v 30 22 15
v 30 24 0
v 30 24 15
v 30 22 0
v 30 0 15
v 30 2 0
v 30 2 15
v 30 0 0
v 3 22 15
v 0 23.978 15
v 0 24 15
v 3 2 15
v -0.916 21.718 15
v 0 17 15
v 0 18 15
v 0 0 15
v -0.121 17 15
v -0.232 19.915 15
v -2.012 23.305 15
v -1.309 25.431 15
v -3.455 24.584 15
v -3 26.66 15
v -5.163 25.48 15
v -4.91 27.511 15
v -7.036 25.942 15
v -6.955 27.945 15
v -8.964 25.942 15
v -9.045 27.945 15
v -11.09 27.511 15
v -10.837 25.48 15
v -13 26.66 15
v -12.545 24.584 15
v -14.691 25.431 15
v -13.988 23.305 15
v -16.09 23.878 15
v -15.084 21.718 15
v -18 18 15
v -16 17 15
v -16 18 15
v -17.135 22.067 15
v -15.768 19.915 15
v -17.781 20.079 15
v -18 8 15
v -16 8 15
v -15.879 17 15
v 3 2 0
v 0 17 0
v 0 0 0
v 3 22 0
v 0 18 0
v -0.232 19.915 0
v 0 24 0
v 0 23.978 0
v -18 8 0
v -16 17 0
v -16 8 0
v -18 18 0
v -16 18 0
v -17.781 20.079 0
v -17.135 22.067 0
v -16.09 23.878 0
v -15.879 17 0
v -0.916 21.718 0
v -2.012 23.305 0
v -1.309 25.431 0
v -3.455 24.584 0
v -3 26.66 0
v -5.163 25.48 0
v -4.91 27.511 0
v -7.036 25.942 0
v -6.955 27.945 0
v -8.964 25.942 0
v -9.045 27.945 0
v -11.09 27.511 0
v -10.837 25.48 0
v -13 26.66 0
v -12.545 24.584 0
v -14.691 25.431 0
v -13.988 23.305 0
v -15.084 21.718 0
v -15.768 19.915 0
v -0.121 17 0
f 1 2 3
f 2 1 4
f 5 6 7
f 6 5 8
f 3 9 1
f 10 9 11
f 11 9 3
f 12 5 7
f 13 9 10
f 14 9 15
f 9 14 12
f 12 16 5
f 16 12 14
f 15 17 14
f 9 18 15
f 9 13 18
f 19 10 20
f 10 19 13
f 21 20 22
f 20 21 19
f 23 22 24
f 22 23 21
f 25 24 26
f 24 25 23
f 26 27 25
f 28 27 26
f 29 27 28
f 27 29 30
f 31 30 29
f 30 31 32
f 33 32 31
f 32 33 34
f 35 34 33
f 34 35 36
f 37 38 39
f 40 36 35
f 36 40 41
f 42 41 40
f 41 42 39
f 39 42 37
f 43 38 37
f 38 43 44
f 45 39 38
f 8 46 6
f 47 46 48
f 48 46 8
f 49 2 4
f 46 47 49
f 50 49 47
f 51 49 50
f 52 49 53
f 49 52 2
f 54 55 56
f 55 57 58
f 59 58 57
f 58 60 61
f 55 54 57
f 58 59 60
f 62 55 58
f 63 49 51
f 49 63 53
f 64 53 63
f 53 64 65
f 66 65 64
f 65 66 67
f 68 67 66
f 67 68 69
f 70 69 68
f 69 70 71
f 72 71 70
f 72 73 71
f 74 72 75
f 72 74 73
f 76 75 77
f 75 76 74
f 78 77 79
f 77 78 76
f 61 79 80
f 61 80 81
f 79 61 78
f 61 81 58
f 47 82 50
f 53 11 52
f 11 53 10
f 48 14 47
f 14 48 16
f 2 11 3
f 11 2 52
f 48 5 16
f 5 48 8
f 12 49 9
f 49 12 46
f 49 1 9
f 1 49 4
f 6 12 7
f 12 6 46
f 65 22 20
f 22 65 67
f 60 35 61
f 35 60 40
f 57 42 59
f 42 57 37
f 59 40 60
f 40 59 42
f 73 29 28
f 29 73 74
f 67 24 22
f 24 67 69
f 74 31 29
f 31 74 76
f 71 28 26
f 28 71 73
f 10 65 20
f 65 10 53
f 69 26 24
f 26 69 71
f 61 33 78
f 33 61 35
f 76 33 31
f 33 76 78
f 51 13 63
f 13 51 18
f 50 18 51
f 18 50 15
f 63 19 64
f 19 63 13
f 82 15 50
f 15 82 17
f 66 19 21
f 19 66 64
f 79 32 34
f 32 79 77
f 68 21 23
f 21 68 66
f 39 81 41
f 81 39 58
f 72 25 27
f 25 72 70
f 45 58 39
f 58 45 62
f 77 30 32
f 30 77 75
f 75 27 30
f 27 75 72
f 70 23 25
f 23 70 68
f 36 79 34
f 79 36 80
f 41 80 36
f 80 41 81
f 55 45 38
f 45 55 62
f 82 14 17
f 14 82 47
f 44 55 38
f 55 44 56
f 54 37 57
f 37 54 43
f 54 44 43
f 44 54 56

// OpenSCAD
difference()
{
	cube([30,24,15]);
	translate([3,2,-3]) cube([30,20,20]);
}
translate([-8,18,0]) difference()
{
	cylinder(d=20,h=15);
	translate([0,0,-3]) cylinder(d=16,h=20);
	translate([-15,-16,-3]) cube([30,15,20]);
}
translate([-18,8,0]) cube([2,10,15]);
